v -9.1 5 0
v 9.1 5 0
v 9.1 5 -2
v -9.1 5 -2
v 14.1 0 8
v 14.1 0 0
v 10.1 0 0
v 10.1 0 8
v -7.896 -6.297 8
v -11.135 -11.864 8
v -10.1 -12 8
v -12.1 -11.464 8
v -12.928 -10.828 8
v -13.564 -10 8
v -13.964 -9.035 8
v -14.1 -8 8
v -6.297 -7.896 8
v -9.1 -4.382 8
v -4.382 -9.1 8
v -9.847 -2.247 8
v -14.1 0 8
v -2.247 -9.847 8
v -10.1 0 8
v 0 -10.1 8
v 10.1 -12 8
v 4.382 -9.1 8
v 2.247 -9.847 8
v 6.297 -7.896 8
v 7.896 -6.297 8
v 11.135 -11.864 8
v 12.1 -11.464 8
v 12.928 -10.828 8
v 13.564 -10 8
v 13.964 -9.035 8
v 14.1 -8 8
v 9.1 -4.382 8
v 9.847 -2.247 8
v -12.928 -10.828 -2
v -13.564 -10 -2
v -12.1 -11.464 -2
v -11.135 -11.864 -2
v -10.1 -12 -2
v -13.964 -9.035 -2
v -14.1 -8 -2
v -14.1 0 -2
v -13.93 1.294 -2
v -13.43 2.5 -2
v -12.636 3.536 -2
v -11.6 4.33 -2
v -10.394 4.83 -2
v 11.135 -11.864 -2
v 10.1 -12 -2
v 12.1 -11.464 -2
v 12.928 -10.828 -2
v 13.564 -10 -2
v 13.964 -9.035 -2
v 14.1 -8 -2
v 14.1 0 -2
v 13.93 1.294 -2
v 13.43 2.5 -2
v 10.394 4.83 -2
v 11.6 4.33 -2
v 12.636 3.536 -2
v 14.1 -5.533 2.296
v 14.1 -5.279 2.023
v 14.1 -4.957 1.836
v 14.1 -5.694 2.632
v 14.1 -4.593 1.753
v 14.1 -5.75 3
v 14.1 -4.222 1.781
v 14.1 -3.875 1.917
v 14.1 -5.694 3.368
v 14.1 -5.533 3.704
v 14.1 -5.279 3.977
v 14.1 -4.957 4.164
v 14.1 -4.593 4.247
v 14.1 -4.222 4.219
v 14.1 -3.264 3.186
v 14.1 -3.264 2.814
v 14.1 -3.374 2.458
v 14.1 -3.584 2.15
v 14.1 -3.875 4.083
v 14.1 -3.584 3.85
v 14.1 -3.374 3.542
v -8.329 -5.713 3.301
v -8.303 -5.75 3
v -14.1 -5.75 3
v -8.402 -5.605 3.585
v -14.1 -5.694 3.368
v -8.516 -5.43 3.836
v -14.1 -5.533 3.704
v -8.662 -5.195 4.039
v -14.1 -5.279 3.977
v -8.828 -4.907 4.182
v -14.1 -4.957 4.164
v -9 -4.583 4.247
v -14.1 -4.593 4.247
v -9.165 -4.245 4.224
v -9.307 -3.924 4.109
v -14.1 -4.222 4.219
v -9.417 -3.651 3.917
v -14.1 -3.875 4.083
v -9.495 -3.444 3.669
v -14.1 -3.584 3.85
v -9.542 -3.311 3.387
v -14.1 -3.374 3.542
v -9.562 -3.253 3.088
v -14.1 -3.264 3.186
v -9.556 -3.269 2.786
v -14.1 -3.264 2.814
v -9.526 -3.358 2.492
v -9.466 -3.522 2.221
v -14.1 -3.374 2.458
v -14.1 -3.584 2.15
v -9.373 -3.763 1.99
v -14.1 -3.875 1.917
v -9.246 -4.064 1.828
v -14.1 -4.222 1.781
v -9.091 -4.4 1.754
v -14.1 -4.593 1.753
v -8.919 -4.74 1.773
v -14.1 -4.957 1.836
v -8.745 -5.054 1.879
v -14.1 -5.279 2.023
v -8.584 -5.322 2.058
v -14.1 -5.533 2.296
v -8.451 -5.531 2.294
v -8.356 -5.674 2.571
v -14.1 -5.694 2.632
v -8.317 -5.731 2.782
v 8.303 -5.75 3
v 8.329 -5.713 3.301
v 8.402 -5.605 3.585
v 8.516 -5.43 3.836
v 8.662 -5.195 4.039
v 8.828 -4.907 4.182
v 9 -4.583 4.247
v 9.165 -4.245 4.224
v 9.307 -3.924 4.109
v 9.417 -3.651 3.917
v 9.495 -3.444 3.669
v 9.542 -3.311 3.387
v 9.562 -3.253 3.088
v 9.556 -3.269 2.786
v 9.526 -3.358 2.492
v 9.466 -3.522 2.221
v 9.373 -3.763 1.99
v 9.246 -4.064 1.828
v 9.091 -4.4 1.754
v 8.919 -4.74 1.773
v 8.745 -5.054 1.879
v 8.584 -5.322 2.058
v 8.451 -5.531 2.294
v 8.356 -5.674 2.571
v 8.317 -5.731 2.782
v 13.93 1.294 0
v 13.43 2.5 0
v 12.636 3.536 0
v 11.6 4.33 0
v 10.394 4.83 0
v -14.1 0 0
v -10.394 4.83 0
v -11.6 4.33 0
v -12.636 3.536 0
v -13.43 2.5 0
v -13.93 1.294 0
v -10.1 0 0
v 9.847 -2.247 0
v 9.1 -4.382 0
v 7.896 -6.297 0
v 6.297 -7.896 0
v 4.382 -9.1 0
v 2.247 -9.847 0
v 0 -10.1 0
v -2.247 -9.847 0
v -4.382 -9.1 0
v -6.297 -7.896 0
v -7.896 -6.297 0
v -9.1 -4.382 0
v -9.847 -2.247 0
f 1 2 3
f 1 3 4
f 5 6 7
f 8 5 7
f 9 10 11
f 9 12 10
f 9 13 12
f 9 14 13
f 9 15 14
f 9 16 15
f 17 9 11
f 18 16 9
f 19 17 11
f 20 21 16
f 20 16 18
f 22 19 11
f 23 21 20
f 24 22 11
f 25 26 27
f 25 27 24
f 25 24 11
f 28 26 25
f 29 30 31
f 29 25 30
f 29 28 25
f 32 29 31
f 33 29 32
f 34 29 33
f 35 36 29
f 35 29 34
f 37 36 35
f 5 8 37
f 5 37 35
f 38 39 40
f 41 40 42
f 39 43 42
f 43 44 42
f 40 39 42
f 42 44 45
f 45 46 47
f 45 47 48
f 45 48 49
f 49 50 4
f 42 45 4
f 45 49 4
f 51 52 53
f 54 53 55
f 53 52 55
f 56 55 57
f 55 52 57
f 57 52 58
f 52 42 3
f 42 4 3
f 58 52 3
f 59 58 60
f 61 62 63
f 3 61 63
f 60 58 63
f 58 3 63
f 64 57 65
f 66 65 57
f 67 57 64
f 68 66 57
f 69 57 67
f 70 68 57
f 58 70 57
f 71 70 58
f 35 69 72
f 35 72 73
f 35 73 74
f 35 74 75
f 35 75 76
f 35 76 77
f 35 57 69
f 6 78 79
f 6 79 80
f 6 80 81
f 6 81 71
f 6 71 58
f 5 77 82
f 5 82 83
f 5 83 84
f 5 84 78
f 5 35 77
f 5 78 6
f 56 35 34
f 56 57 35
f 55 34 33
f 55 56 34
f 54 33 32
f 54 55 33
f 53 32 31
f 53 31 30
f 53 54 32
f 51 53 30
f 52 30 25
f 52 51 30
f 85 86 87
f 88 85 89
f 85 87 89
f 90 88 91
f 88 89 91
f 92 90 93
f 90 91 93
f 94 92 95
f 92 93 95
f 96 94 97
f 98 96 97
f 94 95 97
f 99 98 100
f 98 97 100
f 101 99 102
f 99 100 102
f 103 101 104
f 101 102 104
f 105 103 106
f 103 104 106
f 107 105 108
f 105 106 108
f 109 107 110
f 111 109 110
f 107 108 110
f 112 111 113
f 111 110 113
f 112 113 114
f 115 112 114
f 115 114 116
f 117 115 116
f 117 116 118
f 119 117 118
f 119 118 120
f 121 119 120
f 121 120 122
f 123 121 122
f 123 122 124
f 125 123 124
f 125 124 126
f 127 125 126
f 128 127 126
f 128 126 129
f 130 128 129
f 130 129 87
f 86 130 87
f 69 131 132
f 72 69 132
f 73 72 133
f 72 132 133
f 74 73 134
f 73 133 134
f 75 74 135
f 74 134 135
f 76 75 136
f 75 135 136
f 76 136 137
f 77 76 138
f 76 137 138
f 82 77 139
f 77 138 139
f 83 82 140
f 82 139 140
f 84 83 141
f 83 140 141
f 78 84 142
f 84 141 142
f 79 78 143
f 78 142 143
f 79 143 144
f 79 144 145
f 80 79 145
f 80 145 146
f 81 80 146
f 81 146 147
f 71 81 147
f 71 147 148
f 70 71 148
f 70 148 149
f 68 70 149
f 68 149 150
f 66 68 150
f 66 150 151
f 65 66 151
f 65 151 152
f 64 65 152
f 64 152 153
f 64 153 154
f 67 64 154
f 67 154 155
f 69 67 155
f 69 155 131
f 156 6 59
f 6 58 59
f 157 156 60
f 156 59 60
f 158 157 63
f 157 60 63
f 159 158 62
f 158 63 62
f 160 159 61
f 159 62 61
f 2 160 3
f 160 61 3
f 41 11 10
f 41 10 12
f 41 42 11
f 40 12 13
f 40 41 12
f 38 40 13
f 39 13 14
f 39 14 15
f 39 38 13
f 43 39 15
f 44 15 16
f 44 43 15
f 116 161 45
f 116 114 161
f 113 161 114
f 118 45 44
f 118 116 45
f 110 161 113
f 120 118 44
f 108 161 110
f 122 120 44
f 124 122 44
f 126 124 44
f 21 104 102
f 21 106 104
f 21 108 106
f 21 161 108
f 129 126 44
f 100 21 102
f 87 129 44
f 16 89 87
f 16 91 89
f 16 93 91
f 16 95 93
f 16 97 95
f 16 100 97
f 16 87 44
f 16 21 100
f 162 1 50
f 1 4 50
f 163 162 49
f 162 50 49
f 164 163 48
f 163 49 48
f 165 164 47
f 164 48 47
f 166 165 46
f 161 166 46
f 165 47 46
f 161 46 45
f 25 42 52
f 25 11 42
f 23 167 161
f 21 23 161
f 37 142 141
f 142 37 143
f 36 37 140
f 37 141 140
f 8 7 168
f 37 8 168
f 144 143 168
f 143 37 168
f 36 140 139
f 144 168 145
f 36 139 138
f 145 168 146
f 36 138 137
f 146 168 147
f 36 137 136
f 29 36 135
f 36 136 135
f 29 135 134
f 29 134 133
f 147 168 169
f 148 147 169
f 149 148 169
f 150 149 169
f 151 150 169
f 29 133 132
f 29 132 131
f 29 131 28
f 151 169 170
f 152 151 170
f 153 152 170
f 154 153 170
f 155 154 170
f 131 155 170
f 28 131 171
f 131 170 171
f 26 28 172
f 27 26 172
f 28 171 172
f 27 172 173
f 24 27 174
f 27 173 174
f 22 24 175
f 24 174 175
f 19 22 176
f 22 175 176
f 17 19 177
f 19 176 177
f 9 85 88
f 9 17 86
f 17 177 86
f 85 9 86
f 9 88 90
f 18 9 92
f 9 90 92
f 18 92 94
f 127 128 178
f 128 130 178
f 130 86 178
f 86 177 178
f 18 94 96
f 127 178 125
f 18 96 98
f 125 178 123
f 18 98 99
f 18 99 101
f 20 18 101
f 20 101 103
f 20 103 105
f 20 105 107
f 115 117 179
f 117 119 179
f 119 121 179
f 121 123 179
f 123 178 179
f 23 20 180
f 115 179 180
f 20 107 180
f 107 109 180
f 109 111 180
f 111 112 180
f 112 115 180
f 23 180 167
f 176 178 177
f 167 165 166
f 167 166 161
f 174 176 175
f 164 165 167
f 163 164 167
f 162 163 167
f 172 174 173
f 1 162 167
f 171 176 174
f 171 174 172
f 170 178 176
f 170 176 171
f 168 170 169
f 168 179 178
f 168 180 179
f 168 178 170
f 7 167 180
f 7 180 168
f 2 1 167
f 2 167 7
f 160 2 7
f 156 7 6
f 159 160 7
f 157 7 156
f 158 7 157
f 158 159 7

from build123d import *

# Parameters (mm, degrees)
EXTRUDE_1_DEPTH     = 8
EXTRUDE_2_DEPTH     = 2
SKETCH_3_R          = 1.25
CUT_EXTRUDE_1_DEPTH = 32.673964071
FILLET_1_R          = 5
FILLET_2_R          = 4


with BuildPart() as part:
    # 草图1 → 凸台-拉伸1 (new body)
    with BuildSketch(Plane.XY):
        with BuildLine():
            Line((-10.1, 0), (-14.1, 0))
            Line((-14.1, 0), (-14.1, -12))
            Line((-14.1, -12), (14.1, -12))
            Line((14.1, -12), (14.1, 0))
            Line((14.1, 0), (10.1, 0))
            ThreePointArc((10.1, 0), (0, -10.1), (-10.1, 0))
        make_face()
    extrude(amount=EXTRUDE_1_DEPTH)

    # 草图2 → 凸台-拉伸2 (add)
    with BuildSketch(Plane(origin=(0, 0, 0), x_dir=(-1, 0, 0), z_dir=(0, 0, -1))):
        with BuildLine():
            Line((-14.1, -12), (-14.1, 0))
            ThreePointArc((-14.1, 0), (-13.869033835, 2.541633427), (-13.18370206, 5))
            Line((-13.18370206, 5), (13.18370206, 5))
            ThreePointArc((13.18370206, 5), (13.869033835, 2.541633427), (14.1, 0))
            Line((14.1, 0), (14.1, -12))
            Line((14.1, -12), (-14.1, -12))
        make_face()
    extrude(amount=EXTRUDE_2_DEPTH)

    # 草图3 → 切除-拉伸1 (cut, through all)
    with BuildSketch(Plane.ZY.offset(14.1)):
        with Locations(Location((3, -4.5, 0), (0, 0, 270))):
            Circle(SKETCH_3_R)
    extrude(amount=-CUT_EXTRUDE_1_DEPTH, mode=Mode.SUBTRACT)

    # 圆角1
    fillet_1_edges = [part.edges().sort_by_distance(p)[0] for p in [
        (-13.18370206, 5, -1),
        (13.18370206, 5, -1),
    ]]
    fillet(fillet_1_edges, radius=FILLET_1_R - 0.0001)  # a hair under: the kernel refuses the full size

    # 圆角2
    fillet_2_edges = [part.edges().sort_by_distance(p)[0] for p in [
        (14.1, -12, 3),
        (-14.1, -12, 3),
    ]]
    fillet(fillet_2_edges, radius=FILLET_2_R)


solid = part.part
